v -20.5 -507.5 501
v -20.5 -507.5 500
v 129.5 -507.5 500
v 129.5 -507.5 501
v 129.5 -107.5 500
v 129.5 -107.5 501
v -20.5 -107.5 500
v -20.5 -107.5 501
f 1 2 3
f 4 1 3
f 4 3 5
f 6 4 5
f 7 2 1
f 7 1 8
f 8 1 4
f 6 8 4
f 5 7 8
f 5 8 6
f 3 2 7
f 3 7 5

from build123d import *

# Parameters (mm, degrees)
F0_W     = 150
F0_H     = 400
F1_DEPTH = 1


with BuildPart() as f1:
    # F0 (on Top) → F1 (new body)
    with BuildSketch(Plane.XY):
        with Locations((75, 200)):
            Rectangle(F0_W, F0_H)
    extrude(amount=F1_DEPTH)


with BuildPart() as f1_1:
    # F2: moved
    add(f1.part.moved(Location((-18, -511, 500))))


with BuildPart() as f1_2:
    # F3: moved
    add(f1_1.part.moved(Location((-2.5, 3.5, 0))))


solid = f1_2.part
